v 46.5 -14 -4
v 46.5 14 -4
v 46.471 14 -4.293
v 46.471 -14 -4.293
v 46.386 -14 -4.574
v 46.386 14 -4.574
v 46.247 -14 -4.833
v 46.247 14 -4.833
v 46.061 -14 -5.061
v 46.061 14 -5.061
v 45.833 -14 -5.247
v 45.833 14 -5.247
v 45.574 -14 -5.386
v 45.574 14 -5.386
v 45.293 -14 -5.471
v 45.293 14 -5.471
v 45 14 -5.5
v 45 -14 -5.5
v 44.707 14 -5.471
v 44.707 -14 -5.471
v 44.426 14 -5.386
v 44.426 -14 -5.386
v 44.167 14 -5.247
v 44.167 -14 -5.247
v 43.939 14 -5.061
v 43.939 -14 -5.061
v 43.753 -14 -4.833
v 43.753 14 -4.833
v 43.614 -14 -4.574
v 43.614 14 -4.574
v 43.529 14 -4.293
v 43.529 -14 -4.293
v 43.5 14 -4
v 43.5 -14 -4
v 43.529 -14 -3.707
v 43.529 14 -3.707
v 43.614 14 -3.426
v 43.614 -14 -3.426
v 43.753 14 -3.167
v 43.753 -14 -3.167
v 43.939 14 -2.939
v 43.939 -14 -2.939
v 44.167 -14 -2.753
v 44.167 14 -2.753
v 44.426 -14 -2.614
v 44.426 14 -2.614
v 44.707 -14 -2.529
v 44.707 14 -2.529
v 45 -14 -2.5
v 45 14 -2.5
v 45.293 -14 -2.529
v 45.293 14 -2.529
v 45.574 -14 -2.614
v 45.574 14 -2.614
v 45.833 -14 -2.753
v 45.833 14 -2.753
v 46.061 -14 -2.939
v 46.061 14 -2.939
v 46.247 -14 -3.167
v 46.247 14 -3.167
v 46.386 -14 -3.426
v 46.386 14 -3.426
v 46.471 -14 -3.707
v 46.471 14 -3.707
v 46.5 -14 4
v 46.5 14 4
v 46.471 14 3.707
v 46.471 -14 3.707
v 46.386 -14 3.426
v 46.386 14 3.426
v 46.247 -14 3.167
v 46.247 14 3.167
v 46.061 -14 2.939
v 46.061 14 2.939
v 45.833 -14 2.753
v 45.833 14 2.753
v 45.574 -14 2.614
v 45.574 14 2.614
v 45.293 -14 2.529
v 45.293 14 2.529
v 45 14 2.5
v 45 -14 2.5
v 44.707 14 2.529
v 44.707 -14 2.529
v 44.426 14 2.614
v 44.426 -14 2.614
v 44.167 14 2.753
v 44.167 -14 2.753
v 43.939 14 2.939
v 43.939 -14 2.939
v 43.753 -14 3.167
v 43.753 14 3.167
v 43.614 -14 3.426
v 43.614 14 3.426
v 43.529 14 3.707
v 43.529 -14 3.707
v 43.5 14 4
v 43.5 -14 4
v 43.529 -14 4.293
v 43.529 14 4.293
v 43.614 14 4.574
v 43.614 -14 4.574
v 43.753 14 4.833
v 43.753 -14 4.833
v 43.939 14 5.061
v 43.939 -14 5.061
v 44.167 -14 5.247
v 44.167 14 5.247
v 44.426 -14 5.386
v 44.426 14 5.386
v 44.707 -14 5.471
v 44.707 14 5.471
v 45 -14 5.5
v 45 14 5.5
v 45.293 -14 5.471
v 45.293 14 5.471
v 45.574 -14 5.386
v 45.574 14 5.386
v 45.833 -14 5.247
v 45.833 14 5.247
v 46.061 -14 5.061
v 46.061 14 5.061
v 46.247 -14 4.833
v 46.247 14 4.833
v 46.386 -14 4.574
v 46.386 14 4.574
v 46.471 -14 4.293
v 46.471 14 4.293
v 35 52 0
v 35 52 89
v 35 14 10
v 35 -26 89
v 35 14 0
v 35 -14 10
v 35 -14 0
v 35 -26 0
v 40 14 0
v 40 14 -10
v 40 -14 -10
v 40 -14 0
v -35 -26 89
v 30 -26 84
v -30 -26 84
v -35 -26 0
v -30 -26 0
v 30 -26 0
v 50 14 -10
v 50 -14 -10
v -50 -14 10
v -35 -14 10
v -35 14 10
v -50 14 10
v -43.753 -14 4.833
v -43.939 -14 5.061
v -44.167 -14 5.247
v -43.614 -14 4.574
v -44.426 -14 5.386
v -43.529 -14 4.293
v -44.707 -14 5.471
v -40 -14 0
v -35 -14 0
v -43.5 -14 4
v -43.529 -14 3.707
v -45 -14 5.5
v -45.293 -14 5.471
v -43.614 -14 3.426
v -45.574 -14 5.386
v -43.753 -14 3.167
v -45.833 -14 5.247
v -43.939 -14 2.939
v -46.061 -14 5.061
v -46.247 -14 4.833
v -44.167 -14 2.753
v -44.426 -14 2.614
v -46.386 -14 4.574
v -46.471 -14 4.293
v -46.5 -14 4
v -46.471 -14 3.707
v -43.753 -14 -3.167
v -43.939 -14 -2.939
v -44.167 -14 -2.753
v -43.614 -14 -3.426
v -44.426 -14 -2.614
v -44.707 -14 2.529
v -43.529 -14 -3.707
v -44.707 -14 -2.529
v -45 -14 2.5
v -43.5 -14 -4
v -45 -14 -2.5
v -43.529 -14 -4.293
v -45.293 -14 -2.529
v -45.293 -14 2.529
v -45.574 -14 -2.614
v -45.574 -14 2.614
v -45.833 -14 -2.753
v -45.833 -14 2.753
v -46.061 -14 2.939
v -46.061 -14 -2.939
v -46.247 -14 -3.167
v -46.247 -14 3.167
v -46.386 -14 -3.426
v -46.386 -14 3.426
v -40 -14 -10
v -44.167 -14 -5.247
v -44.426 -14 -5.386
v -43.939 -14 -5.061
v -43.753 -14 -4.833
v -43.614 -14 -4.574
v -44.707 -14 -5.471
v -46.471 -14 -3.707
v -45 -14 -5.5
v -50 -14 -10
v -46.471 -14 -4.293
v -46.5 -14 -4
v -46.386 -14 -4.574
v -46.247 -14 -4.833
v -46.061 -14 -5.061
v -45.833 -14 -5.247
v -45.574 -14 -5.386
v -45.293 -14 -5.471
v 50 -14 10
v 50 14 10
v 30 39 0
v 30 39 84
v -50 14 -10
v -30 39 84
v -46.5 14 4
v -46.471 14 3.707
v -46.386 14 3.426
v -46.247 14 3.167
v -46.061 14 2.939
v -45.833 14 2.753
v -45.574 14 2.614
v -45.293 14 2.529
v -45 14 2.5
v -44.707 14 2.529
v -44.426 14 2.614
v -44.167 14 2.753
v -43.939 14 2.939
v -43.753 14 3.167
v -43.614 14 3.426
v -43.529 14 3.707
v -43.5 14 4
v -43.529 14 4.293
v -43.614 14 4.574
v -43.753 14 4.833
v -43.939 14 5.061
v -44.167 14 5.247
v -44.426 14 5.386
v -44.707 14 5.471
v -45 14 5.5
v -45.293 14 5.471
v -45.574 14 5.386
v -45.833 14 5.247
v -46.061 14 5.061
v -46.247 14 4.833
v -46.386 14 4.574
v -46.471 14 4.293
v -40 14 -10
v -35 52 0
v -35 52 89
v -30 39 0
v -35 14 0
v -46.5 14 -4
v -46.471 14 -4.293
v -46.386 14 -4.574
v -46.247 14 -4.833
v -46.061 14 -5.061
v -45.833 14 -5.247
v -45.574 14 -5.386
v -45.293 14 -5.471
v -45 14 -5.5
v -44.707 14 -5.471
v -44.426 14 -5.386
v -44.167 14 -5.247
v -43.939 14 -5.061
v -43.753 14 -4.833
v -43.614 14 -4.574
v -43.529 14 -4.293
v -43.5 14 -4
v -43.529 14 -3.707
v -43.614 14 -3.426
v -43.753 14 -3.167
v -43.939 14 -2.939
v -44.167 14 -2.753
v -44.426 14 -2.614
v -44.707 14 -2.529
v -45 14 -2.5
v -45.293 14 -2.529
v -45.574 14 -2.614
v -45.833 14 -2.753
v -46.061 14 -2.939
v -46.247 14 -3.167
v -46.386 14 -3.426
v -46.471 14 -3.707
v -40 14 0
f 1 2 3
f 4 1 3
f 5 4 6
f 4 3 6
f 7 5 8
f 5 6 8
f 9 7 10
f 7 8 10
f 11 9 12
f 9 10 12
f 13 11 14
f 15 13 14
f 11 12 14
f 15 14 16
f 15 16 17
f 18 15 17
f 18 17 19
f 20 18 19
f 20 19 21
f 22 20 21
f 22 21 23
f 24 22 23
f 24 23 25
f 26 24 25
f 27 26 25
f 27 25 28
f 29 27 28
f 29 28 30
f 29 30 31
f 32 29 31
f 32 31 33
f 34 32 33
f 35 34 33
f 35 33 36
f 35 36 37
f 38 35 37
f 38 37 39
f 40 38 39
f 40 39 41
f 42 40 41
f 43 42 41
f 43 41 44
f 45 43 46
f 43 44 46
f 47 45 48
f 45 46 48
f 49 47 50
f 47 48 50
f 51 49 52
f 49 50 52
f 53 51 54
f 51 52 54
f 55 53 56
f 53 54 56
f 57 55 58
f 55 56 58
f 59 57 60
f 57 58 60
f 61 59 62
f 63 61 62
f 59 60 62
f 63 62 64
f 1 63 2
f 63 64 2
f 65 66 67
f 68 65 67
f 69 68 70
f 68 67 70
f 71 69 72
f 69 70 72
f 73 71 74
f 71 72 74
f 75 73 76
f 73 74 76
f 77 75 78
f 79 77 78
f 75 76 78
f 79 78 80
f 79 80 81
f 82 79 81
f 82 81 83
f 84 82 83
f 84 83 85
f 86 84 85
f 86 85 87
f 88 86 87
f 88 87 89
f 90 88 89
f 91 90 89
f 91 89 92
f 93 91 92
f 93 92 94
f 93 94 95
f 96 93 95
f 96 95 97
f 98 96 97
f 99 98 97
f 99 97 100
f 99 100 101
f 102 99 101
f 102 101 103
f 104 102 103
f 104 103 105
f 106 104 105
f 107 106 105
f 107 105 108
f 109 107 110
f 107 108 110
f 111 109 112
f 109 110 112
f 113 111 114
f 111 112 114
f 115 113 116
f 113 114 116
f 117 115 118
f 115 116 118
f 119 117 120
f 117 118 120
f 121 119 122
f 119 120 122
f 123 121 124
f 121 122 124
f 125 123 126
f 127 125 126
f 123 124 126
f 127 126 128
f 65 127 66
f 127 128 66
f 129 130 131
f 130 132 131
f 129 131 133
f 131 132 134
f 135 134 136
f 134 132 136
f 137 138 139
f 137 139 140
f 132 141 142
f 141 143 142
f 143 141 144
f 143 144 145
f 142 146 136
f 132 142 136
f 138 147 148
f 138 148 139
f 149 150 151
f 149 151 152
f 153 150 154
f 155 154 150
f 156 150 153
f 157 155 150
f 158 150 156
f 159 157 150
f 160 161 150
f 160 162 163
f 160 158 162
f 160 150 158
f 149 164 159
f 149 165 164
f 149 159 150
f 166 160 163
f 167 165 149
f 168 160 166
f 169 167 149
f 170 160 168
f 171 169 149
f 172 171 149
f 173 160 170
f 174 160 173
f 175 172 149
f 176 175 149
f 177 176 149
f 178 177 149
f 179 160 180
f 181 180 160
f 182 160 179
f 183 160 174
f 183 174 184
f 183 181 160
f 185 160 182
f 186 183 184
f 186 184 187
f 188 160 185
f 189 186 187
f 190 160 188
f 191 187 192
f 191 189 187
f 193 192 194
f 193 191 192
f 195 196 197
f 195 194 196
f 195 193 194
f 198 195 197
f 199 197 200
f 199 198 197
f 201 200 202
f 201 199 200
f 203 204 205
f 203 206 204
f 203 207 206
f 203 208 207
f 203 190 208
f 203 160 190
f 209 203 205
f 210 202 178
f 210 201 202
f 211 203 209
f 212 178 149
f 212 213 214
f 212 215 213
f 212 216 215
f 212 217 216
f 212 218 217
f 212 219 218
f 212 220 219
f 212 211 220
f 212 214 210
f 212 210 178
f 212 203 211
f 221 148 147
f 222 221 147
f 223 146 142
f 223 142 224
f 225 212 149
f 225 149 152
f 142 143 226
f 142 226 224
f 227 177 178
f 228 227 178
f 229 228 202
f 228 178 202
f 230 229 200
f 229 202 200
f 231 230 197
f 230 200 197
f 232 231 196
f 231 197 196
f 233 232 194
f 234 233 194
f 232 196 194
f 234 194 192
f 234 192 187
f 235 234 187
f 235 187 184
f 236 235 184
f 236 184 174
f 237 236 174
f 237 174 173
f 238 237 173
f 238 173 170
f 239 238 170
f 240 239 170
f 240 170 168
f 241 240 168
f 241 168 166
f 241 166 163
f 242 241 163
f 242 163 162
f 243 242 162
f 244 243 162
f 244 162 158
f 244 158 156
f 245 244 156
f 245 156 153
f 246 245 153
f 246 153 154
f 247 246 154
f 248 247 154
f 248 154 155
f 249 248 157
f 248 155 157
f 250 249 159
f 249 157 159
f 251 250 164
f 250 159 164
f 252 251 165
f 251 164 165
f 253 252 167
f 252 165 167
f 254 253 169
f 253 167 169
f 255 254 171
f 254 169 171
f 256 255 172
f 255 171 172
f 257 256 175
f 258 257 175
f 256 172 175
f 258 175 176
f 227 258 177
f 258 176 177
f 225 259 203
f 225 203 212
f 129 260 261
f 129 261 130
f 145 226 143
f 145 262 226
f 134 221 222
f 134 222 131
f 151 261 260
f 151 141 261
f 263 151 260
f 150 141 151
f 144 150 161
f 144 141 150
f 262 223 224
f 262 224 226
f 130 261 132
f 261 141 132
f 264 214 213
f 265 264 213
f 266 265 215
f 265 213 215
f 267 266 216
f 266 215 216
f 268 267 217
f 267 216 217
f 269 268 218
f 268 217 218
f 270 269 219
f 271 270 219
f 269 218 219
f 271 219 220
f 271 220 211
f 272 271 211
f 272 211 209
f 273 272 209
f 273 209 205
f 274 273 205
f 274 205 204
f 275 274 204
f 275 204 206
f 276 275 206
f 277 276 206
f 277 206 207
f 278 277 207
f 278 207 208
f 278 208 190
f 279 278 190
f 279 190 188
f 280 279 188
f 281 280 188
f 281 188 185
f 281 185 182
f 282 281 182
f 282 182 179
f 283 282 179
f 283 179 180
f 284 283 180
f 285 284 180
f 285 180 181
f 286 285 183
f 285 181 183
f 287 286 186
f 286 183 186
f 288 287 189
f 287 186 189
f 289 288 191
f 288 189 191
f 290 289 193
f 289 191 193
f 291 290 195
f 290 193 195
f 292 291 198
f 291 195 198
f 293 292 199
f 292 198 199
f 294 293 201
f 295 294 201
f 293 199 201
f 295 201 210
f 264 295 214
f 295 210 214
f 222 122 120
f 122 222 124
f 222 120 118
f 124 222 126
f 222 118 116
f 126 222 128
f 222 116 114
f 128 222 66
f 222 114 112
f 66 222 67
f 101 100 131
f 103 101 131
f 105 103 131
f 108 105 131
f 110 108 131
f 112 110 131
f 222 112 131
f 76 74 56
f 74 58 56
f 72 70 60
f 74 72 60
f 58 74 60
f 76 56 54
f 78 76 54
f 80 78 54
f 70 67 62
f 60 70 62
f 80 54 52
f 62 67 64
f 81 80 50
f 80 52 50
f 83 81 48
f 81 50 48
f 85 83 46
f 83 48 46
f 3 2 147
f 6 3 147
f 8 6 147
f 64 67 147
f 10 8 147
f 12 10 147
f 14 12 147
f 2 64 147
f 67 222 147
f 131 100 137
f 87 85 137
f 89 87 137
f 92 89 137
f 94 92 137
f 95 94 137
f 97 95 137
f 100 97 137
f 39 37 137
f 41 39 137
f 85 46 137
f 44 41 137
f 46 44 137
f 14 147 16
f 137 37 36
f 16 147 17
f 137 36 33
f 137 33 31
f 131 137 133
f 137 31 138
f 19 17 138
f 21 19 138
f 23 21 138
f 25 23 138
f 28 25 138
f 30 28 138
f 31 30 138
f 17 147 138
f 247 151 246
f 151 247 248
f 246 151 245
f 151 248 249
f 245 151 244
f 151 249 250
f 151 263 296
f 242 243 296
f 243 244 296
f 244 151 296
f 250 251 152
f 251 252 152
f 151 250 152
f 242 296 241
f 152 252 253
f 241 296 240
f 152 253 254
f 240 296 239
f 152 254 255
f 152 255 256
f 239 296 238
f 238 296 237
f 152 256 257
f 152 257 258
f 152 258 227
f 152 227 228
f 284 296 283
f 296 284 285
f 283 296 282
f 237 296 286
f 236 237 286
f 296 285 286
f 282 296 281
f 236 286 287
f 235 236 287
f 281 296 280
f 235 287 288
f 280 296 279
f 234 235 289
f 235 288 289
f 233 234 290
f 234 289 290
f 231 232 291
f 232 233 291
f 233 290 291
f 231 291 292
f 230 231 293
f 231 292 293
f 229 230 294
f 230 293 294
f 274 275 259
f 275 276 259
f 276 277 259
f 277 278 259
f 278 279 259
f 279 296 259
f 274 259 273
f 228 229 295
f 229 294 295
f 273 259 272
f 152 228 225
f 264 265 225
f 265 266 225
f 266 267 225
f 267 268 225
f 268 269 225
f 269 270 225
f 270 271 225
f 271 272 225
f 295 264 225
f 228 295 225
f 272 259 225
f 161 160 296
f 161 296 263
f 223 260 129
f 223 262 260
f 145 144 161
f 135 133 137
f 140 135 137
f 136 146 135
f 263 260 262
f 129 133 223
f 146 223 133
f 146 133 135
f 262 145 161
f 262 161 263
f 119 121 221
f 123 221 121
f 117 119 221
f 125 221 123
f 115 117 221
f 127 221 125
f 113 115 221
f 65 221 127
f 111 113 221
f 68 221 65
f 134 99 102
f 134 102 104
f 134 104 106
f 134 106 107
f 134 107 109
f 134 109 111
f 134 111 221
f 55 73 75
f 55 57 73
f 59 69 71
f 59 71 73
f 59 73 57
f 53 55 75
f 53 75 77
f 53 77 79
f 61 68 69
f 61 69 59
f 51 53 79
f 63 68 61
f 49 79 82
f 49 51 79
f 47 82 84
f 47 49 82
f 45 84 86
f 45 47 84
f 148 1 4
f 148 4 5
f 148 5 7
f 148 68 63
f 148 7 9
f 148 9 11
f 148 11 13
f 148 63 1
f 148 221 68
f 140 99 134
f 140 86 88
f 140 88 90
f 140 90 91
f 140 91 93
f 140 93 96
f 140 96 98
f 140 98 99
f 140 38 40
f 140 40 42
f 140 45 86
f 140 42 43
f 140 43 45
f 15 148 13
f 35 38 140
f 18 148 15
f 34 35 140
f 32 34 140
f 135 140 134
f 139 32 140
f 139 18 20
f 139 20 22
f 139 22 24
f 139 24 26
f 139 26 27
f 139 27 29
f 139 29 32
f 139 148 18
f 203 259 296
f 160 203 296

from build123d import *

# Parameters (mm, degrees)
SKETCH_1_W            = 100
SKETCH_1_H            = 28
EXTRUDE_1_DEPTH       = 20
SKETCH_2_W            = 80
SKETCH_2_H            = 10
CUT_EXTRUDE_1_DEPTH   = 59.172158289
SKETCH_3_W            = 70
SKETCH_3_H            = 10
EXTRUDE_2_DEPTH       = 25
SKETCH_4_W            = 70
SKETCH_4_H            = 10
EXTRUDE_3_DEPTH       = 12
HOLE_WIZARD_3_0_3_1_D = 3
HOLE_WIZARD_3_0_3_2_D = 3
SKETCH_13_W           = 70
SKETCH_13_H           = 5
EXTRUDE_4_DEPTH       = 10
CUT_EXTRUDE_3_DEPTH   = 10
EXTRUDE_5_DEPTH       = 74
SKETCH_17_W           = 70
SKETCH_17_H           = 5
EXTRUDE_6_DEPTH       = 70
SKETCH_18_W           = 70
SKETCH_18_H           = 89
EXTRUDE_7_DEPTH       = 8


with BuildPart() as part:
    # 草图1 → 凸台-拉伸1 (new body)
    with BuildSketch(Plane(origin=(0, 0, -10), x_dir=(-1, 0, 0), z_dir=(0, 0, -1))):
        Rectangle(SKETCH_1_W, SKETCH_1_H)
    extrude(amount=-EXTRUDE_1_DEPTH)

    # 草图2 → 切除-拉伸1 (cut, through all)
    with BuildSketch(Plane(origin=(0, 14, 0), x_dir=(-1, 0, 0), z_dir=(0, 1, 0))):
        with Locations((0, -5)):
            Rectangle(SKETCH_2_W, SKETCH_2_H)
    extrude(amount=-CUT_EXTRUDE_1_DEPTH, mode=Mode.SUBTRACT)

    # 草图3 → 凸台-拉伸2 (add)
    with BuildSketch(Plane(origin=(0, 14, 0), x_dir=(-1, 0, 0), z_dir=(0, 1, 0))):
        with Locations((0, 5)):
            Rectangle(SKETCH_3_W, SKETCH_3_H)
    extrude(amount=EXTRUDE_2_DEPTH)

    # 草图4 → 凸台-拉伸3 (add)
    with BuildSketch(Plane.XZ.offset(14)):
        with Locations((0, 5)):
            Rectangle(SKETCH_4_W, SKETCH_4_H)
    extrude(amount=EXTRUDE_3_DEPTH)

    # Ø3.0 (3) 直径孔1 (through all)
    with Locations(Plane(origin=(0, 14, 0), x_dir=(1, 0, 0), z_dir=(0, 1, 0))):
        with Locations((-45, -4), (-45, 4)):
            Hole(HOLE_WIZARD_3_0_3_1_D / 2)

    # Ø3.0 (3) 直径孔2 (through all)
    with Locations(Plane(origin=(0, -14, 0), x_dir=(-1, 0, 0), z_dir=(0, -1, 0))):
        with Locations((-45, 4), (-45, -4)):
            Hole(HOLE_WIZARD_3_0_3_2_D / 2)

    # 草图13 → 凸台-拉伸4 (add)
    with BuildSketch(Plane(origin=(0, 0, 0), x_dir=(-1, 0, 0), z_dir=(0, 0, -1))):
        with Locations((0, 41.5)):
            Rectangle(SKETCH_13_W, SKETCH_13_H)
    extrude(amount=-EXTRUDE_4_DEPTH)

    # 草图15 → 切除-拉伸3 (cut)
    with BuildSketch(Plane(origin=(0, 0, 0), x_dir=(-1, 0, 0), z_dir=(0, 0, -1))):
        Polygon((0, -26), (30, -26), (30, 39), (-30, 39), (-30, -26), align=None)
    extrude(amount=-CUT_EXTRUDE_3_DEPTH, mode=Mode.SUBTRACT)

    # 草图16 → 凸台-拉伸5 (add)
    with BuildSketch(Plane.XY.offset(10)):
        Polygon((-35, -26), (-35, 44), (35, 44), (35, -26), (30, -26), (30, 39), (-30, 39), (-30, -26), align=None)
    extrude(amount=EXTRUDE_5_DEPTH)

    # 草图17 → 凸台-拉伸6 (add)
    with BuildSketch(Plane(origin=(0, 44, 0), x_dir=(1, 0, 0), z_dir=(0, 1, 0))):
        with Locations((0, -86.5)):
            Rectangle(SKETCH_17_W, SKETCH_17_H)
    extrude(amount=-EXTRUDE_6_DEPTH)

    # 草图18 → 凸台-拉伸7 (add)
    with BuildSketch(Plane(origin=(0, 44, 0), x_dir=(1, 0, 0), z_dir=(0, 1, 0))):
        with Locations((0, -44.5)):
            Rectangle(SKETCH_18_W, SKETCH_18_H)
    extrude(amount=EXTRUDE_7_DEPTH)


solid = part.part
